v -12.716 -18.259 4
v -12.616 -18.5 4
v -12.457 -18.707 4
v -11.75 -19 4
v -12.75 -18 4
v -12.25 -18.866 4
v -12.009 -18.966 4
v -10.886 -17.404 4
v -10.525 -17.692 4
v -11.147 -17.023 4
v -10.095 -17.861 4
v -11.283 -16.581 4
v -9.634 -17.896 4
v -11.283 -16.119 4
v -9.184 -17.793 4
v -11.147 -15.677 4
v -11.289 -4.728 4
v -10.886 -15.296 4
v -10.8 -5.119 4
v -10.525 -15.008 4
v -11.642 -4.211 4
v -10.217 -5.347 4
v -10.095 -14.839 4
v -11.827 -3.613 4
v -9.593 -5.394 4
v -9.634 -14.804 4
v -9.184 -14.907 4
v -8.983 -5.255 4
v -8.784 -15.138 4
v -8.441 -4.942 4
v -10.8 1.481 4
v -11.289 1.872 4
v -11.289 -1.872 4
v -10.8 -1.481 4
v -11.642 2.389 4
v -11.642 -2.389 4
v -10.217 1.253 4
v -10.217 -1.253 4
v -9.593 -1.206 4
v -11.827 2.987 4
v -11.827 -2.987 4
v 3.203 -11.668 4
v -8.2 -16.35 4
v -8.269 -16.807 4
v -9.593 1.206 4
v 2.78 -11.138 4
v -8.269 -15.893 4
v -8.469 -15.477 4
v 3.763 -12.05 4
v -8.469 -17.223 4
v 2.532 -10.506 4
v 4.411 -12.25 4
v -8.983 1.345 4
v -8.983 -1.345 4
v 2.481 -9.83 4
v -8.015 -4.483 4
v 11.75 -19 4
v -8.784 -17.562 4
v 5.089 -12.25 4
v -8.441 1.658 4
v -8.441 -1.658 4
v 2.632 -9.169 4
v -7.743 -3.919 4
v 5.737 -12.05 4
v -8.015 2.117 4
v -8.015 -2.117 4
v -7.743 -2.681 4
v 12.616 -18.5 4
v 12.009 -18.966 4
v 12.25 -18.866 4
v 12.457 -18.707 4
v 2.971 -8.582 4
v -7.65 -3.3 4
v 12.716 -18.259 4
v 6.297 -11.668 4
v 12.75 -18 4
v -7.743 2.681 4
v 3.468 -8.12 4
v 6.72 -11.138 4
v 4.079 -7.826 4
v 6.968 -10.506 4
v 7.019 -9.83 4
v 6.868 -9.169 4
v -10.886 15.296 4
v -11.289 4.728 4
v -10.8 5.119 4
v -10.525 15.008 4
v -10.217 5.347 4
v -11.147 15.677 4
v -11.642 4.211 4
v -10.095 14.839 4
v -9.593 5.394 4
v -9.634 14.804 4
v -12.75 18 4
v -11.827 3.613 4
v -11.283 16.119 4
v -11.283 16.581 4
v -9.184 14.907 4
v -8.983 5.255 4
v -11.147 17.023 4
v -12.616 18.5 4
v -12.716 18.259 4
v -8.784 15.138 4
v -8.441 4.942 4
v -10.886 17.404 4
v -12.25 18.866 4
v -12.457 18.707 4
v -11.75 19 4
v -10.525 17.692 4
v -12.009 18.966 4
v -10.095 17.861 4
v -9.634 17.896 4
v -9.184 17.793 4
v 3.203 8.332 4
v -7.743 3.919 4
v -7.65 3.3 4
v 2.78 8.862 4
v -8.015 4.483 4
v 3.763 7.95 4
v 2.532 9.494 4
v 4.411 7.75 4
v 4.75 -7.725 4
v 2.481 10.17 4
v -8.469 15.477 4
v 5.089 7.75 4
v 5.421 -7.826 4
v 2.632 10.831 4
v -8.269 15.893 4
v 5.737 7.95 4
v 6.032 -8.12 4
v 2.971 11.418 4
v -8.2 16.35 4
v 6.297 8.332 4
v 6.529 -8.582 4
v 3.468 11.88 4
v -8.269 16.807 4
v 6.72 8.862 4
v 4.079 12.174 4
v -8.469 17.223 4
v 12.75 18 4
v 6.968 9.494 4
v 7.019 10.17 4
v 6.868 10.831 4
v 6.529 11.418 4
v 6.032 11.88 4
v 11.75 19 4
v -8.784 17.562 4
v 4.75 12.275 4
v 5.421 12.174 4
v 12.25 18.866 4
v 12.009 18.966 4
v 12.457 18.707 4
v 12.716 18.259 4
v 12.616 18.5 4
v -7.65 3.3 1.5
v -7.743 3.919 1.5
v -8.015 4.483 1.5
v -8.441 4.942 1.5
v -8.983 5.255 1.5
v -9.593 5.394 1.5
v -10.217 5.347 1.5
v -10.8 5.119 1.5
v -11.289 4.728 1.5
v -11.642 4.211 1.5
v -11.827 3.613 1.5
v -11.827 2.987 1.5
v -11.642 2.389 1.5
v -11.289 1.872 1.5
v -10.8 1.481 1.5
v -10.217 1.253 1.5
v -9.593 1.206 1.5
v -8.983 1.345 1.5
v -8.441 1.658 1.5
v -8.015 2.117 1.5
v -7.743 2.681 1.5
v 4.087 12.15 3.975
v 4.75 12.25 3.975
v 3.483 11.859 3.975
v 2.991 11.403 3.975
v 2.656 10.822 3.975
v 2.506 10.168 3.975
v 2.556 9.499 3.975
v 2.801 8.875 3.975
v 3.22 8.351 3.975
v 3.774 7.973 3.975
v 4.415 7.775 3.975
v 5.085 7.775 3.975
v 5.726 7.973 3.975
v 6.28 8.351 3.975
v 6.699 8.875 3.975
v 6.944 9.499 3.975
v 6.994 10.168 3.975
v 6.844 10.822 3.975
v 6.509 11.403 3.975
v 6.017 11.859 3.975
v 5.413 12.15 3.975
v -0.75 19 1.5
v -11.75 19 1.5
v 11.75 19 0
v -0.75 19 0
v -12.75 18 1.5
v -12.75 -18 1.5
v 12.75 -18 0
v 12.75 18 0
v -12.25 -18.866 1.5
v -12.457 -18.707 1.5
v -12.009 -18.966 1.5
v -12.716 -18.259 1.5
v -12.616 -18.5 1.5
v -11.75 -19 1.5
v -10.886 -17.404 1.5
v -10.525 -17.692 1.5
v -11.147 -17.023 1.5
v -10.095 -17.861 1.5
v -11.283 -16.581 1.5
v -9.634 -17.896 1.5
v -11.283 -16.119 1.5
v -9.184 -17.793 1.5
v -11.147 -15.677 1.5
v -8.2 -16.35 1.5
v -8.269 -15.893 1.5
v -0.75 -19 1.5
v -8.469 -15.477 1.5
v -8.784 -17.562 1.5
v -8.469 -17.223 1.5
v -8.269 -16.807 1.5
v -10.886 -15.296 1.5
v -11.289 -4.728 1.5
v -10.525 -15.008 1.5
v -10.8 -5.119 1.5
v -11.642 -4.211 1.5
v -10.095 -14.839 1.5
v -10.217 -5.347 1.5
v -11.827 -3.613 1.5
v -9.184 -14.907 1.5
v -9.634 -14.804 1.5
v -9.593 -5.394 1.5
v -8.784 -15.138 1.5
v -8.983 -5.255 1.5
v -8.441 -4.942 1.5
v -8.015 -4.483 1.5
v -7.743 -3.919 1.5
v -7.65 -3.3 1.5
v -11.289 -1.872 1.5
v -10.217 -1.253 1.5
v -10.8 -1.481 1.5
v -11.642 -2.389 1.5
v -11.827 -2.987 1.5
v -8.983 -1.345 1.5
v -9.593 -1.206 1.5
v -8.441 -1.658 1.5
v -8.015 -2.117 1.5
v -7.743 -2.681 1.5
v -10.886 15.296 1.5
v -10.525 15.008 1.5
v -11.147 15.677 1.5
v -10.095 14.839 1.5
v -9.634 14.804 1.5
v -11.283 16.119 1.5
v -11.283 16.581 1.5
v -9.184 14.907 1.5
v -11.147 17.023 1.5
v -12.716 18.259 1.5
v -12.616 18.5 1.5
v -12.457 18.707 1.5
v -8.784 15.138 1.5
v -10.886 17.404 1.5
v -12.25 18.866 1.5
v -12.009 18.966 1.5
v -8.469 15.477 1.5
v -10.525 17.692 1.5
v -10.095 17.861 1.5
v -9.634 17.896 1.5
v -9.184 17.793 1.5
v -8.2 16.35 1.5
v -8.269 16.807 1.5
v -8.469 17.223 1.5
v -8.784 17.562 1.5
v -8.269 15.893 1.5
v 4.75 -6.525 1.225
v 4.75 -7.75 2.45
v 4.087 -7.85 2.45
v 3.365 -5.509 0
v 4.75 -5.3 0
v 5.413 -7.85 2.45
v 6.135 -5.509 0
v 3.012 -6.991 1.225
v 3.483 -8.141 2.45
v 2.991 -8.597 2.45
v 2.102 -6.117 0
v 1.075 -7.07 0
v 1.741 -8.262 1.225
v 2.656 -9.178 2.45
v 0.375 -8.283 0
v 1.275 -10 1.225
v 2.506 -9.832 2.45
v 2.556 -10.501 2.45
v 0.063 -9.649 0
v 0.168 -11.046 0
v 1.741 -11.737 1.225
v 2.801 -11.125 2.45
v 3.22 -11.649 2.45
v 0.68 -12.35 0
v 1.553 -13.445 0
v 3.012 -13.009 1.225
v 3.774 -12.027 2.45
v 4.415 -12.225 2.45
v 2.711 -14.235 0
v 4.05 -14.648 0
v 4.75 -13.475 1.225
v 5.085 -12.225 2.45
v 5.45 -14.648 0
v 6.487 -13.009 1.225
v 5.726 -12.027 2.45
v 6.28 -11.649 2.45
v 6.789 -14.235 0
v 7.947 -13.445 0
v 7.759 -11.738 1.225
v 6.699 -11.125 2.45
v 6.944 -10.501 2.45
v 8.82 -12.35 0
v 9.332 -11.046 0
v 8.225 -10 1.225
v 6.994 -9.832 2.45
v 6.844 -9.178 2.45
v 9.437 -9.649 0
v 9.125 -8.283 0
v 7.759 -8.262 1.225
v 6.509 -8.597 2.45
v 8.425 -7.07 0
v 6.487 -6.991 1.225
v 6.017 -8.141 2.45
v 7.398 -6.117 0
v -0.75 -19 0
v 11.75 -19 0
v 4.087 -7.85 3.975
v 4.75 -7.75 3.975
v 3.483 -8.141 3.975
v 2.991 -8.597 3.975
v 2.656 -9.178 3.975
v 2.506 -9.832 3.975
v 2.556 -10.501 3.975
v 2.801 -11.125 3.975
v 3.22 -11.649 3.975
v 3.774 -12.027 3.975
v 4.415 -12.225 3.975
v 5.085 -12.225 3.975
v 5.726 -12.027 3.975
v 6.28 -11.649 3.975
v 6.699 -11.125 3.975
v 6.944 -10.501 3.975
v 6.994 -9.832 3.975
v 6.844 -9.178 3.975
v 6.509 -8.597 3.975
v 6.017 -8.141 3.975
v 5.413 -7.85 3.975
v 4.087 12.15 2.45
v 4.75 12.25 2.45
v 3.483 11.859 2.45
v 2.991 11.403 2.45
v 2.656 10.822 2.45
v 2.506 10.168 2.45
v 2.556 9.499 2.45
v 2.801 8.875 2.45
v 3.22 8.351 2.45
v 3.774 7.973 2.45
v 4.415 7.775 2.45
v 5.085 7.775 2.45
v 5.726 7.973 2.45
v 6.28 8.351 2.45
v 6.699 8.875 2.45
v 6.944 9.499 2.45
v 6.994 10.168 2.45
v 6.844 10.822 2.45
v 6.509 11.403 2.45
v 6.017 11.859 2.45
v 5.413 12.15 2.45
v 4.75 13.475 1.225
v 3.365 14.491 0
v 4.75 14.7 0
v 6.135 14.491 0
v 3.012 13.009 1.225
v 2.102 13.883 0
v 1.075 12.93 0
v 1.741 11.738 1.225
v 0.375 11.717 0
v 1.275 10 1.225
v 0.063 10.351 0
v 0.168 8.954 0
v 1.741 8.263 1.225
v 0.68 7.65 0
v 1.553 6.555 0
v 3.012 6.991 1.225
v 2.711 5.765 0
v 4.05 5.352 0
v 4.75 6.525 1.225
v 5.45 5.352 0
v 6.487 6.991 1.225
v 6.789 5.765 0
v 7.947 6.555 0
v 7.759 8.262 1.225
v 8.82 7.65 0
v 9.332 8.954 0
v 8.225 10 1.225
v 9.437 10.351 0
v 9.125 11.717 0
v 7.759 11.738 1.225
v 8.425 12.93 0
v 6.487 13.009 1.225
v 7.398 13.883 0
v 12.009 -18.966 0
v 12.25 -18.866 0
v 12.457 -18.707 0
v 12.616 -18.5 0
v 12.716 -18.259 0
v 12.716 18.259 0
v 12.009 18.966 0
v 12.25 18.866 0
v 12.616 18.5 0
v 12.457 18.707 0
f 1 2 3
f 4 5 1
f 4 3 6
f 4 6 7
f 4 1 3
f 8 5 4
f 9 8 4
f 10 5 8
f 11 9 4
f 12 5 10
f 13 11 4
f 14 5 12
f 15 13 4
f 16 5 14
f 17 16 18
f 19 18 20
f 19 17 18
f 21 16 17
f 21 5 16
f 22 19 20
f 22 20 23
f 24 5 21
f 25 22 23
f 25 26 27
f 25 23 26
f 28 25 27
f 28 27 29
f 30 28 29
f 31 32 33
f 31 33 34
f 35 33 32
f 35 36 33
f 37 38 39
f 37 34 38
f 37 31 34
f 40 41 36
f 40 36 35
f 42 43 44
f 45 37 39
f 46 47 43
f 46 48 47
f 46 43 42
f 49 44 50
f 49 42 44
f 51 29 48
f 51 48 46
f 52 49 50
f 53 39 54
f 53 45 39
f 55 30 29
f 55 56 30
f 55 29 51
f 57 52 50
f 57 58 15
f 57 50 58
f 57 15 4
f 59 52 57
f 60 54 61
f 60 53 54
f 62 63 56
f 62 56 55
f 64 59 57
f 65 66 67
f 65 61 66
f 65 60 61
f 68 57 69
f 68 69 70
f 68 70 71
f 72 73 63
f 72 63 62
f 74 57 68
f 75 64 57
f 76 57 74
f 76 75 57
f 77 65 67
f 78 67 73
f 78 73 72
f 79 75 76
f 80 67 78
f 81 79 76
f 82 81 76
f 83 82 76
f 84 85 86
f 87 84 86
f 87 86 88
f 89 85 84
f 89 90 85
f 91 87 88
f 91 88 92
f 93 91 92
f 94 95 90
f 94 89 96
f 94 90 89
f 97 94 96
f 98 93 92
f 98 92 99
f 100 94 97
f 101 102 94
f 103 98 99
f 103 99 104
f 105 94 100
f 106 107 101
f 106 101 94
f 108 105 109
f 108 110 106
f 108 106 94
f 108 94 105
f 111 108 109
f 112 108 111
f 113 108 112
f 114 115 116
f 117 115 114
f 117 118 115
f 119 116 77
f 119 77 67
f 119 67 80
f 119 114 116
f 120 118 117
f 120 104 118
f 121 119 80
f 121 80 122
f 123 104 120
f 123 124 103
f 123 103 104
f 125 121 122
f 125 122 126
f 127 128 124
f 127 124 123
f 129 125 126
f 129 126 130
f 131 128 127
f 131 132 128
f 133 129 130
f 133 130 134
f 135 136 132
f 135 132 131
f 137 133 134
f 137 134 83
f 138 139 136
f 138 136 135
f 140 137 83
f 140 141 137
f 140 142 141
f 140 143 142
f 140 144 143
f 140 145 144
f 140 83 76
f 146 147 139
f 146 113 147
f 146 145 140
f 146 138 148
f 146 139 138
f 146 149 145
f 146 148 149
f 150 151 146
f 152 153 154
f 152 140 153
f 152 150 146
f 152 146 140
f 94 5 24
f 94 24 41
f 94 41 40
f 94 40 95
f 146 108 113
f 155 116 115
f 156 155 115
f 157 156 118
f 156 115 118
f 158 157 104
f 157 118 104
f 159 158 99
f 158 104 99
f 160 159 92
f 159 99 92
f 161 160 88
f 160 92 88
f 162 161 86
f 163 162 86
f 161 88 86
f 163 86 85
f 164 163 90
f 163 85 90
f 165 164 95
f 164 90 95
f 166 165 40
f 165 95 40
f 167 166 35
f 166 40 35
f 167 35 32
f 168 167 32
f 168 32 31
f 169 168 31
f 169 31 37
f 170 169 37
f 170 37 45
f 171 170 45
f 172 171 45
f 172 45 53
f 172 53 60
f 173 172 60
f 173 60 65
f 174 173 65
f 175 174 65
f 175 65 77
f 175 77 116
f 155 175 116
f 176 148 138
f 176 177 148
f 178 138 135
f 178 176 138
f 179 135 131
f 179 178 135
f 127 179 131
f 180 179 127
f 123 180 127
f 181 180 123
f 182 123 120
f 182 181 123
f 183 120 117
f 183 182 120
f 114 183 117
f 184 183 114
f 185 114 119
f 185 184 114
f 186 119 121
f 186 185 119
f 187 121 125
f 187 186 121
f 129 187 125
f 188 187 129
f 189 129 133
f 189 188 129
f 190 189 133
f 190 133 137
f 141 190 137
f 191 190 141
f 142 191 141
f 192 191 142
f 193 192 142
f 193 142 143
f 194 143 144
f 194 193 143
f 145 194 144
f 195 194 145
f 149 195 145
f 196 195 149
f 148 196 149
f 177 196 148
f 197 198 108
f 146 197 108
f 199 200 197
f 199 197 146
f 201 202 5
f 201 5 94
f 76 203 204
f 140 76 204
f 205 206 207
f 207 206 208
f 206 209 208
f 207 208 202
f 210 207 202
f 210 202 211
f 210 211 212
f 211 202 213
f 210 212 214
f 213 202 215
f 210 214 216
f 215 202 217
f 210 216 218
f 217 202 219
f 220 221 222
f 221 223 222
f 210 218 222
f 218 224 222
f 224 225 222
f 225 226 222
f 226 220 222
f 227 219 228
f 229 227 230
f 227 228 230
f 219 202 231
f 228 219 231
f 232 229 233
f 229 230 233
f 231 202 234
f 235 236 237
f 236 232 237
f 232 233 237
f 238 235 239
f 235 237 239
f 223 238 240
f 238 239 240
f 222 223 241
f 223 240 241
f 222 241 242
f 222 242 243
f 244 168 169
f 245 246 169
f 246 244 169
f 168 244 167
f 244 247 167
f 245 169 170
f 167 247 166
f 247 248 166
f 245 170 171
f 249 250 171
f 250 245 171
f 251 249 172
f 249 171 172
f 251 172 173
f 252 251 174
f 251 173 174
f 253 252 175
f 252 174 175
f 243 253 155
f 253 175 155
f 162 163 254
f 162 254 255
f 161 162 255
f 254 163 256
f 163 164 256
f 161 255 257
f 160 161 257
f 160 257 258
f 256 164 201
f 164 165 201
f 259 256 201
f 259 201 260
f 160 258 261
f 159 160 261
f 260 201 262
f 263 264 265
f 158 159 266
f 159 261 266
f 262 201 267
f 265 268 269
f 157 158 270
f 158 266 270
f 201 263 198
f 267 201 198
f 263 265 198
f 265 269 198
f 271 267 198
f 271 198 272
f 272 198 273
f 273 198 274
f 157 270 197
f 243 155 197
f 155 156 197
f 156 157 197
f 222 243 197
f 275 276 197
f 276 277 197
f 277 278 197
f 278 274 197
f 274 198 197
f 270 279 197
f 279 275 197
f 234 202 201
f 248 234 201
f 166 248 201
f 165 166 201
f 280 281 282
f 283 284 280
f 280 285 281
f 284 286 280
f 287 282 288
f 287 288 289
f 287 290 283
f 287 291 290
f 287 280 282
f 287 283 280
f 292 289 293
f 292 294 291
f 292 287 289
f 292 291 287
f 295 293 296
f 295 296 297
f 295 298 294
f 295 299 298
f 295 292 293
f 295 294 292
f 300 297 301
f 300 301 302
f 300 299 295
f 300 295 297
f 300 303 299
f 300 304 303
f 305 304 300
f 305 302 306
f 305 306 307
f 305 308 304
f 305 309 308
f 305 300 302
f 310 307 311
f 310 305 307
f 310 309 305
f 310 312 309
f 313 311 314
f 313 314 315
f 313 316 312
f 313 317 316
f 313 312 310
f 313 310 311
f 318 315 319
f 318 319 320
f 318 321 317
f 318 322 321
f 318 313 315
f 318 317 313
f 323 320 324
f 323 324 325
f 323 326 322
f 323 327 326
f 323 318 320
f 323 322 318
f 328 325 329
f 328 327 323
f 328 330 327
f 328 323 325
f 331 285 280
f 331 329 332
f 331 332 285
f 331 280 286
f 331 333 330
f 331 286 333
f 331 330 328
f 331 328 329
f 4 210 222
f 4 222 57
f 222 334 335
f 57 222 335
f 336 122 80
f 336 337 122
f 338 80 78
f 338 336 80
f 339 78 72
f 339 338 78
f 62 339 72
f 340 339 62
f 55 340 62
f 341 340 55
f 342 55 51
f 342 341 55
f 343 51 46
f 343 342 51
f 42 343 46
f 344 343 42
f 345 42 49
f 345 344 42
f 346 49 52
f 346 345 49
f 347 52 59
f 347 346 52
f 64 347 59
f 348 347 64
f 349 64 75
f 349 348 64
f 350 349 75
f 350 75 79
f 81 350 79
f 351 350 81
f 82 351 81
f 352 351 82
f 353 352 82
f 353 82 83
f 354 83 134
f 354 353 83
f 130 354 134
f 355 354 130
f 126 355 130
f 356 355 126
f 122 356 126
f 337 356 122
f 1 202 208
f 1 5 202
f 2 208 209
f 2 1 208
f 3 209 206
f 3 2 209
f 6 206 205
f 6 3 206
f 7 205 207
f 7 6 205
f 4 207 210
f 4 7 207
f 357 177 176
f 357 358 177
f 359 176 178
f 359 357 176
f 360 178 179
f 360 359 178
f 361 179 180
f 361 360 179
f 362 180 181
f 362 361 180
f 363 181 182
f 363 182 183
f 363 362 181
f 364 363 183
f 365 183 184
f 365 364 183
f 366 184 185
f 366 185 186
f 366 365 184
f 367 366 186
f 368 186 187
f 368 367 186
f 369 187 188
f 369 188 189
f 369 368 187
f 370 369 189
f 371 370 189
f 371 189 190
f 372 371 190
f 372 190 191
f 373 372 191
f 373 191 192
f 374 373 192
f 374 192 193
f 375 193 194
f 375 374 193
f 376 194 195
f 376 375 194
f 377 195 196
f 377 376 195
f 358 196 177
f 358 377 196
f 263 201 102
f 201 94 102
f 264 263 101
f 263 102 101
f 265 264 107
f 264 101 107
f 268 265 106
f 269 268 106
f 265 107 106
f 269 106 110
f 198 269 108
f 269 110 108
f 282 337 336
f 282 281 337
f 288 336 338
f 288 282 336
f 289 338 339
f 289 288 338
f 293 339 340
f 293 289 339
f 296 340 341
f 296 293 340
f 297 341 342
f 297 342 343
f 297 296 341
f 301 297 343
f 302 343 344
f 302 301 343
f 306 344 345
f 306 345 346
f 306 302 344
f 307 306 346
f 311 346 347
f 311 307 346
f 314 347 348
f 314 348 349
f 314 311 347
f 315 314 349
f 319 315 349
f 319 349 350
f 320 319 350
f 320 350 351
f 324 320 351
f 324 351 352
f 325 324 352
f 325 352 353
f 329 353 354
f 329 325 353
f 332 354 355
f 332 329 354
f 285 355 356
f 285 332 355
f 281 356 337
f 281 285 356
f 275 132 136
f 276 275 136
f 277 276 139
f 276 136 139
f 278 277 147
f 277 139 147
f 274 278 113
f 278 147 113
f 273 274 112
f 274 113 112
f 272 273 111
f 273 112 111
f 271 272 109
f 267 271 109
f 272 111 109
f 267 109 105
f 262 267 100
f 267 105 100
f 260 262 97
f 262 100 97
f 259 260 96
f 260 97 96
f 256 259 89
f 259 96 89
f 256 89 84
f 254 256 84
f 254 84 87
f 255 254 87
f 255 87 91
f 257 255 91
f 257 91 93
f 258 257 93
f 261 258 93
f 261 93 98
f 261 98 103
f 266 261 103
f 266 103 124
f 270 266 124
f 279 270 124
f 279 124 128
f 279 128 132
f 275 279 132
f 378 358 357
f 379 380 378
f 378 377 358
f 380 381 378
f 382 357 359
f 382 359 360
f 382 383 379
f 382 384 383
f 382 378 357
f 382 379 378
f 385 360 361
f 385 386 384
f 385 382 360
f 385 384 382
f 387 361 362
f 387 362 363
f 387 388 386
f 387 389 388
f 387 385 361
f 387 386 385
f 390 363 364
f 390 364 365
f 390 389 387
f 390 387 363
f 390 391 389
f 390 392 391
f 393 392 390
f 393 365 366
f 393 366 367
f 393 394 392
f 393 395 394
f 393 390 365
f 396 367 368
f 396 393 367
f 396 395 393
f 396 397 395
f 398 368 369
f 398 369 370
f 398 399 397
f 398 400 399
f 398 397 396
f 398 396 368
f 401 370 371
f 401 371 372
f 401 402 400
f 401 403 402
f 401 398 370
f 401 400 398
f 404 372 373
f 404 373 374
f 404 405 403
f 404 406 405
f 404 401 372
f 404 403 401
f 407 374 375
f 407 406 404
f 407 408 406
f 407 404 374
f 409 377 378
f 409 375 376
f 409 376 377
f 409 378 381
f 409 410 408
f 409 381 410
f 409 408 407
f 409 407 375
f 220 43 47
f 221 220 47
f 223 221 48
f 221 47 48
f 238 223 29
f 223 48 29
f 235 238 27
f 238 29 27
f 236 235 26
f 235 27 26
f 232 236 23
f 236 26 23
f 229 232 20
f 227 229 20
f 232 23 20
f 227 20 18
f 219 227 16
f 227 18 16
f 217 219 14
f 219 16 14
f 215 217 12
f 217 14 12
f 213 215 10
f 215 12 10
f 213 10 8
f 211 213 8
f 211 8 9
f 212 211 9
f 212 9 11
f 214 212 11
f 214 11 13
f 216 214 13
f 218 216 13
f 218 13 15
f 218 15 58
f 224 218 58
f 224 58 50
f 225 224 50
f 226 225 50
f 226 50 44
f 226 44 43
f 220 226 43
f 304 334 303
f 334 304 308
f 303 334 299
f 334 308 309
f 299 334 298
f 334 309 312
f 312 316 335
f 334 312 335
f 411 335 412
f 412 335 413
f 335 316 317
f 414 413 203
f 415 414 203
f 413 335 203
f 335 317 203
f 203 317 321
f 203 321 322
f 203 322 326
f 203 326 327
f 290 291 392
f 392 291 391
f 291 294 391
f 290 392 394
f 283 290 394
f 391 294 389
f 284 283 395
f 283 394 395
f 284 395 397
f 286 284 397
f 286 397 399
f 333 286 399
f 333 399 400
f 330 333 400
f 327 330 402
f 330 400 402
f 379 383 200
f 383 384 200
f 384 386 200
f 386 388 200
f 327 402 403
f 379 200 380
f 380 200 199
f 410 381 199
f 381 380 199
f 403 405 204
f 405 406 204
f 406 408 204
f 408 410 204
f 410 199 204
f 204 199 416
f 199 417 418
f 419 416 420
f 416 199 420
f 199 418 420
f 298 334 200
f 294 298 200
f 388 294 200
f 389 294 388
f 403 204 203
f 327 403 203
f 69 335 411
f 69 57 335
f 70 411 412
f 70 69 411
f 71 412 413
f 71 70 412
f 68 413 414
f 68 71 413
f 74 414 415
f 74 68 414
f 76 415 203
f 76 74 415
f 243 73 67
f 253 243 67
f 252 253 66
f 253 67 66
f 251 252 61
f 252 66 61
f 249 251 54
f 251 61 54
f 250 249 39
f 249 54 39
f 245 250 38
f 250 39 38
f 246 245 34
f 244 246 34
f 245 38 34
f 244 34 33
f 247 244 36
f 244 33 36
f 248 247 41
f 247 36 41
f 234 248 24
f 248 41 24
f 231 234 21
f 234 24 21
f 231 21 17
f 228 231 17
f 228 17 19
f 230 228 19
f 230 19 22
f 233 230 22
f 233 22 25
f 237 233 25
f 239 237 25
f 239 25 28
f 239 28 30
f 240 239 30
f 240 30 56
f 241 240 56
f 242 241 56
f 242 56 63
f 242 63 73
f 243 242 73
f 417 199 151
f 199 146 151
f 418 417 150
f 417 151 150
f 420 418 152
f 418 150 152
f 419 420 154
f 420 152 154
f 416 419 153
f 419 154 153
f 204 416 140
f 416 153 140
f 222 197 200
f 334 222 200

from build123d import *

# Parameters (mm, degrees)
SKETCH1_W                                    = 25.5
SKETCH1_H                                    = 38
BOSS_EXTRUDE1_DEPTH                          = 4
CUT_EXTRUDE1_REACH                           = 42.281
SKETCH2_W                                    = 12
SKETCH2_H                                    = 1.5
CSK_FOR_M4_COUNTERSUNK_FLAT_HEAD_SCR_2_COUNT = 2
CSK_FOR_M4_COUNTERSUNK_FLAT_HEAD_SCR_2_PITCH = 20
M3_CLEARANCE_HOLE1_D                         = 3.1
HOLE1_D                                      = 4.2
FILLET1_R                                    = 1


with BuildPart() as part:
    # Sketch1 → Boss-Extrude1 (new body)
    with BuildSketch(Plane.XY):
        Rectangle(SKETCH1_W, SKETCH1_H)
    extrude(amount=BOSS_EXTRUDE1_DEPTH)

    # Sketch2 → Cut-Extrude1 (cut, up to next)
    with BuildSketch(Plane(origin=(0, 19, 0), x_dir=(1, 0, 0), z_dir=(0, 1, 0)), mode=Mode.PRIVATE) as cut_extrude1_sk1:
        with Locations((-6.75, -0.75)):
            Rectangle(SKETCH2_W, SKETCH2_H)
    cut_extrude1_tool1 = extrude(cut_extrude1_sk1.sketch, amount=-CUT_EXTRUDE1_REACH, mode=Mode.PRIVATE) & part.part
    add(cut_extrude1_tool1.solids().sort_by_distance((-6.75, 19, 0.75))[0], mode=Mode.SUBTRACT)

    # Sketch5 → CSK for M4 Countersunk Flat Head Screw1 (revolve, cut)
    with BuildSketch(Plane(origin=(4.75, 10, 0), x_dir=(0, 1, 0), z_dir=(1, 0, 0))):
        Polygon((0, 0), (0, 4), (2.275, 4), (2.25, 3.975), (2.25, 2.45), (4.7, 0), align=None)
    csk_for_m4_countersunk_flat_head_screw1 = revolve(axis=Axis((4.75, 10, -6.35), (0, 0, 1)), mode=Mode.SUBTRACT)

    # CSK for M4 Countersunk Flat Head Scr 2: CSK for M4 Countersunk Flat Head Screw1 ×2
    with Locations(*[(0, -i * CSK_FOR_M4_COUNTERSUNK_FLAT_HEAD_SCR_2_PITCH, 0) for i in range(1, CSK_FOR_M4_COUNTERSUNK_FLAT_HEAD_SCR_2_COUNT)]):
        add(csk_for_m4_countersunk_flat_head_screw1, mode=Mode.SUBTRACT)

    # M3 Clearance Hole1 (through all)
    with Locations(Plane(origin=(0, 0, 1.5), x_dir=(-1, 0, 0), z_dir=(0, 0, -1))):
        with Locations((9.75, -16.35), (9.75, 16.35)):
            Hole(M3_CLEARANCE_HOLE1_D / 2)

    # Hole1 (through all)
    with Locations(Plane(origin=(0, 0, 1.5), x_dir=(-1, 0, 0), z_dir=(0, 0, -1))):
        with Locations((9.75, -3.3), (9.75, 3.3)):
            Hole(HOLE1_D / 2)

    # Fillet1
    fillet1_edges = [part.edges().sort_by_distance(p)[0] for p in [
        (-12.75, 19, 2.75),
        (12.75, 19, 2),
        (12.75, -19, 2),
        (-12.75, -19, 2.75),
    ]]
    fillet(fillet1_edges, radius=FILLET1_R)


solid = part.part
